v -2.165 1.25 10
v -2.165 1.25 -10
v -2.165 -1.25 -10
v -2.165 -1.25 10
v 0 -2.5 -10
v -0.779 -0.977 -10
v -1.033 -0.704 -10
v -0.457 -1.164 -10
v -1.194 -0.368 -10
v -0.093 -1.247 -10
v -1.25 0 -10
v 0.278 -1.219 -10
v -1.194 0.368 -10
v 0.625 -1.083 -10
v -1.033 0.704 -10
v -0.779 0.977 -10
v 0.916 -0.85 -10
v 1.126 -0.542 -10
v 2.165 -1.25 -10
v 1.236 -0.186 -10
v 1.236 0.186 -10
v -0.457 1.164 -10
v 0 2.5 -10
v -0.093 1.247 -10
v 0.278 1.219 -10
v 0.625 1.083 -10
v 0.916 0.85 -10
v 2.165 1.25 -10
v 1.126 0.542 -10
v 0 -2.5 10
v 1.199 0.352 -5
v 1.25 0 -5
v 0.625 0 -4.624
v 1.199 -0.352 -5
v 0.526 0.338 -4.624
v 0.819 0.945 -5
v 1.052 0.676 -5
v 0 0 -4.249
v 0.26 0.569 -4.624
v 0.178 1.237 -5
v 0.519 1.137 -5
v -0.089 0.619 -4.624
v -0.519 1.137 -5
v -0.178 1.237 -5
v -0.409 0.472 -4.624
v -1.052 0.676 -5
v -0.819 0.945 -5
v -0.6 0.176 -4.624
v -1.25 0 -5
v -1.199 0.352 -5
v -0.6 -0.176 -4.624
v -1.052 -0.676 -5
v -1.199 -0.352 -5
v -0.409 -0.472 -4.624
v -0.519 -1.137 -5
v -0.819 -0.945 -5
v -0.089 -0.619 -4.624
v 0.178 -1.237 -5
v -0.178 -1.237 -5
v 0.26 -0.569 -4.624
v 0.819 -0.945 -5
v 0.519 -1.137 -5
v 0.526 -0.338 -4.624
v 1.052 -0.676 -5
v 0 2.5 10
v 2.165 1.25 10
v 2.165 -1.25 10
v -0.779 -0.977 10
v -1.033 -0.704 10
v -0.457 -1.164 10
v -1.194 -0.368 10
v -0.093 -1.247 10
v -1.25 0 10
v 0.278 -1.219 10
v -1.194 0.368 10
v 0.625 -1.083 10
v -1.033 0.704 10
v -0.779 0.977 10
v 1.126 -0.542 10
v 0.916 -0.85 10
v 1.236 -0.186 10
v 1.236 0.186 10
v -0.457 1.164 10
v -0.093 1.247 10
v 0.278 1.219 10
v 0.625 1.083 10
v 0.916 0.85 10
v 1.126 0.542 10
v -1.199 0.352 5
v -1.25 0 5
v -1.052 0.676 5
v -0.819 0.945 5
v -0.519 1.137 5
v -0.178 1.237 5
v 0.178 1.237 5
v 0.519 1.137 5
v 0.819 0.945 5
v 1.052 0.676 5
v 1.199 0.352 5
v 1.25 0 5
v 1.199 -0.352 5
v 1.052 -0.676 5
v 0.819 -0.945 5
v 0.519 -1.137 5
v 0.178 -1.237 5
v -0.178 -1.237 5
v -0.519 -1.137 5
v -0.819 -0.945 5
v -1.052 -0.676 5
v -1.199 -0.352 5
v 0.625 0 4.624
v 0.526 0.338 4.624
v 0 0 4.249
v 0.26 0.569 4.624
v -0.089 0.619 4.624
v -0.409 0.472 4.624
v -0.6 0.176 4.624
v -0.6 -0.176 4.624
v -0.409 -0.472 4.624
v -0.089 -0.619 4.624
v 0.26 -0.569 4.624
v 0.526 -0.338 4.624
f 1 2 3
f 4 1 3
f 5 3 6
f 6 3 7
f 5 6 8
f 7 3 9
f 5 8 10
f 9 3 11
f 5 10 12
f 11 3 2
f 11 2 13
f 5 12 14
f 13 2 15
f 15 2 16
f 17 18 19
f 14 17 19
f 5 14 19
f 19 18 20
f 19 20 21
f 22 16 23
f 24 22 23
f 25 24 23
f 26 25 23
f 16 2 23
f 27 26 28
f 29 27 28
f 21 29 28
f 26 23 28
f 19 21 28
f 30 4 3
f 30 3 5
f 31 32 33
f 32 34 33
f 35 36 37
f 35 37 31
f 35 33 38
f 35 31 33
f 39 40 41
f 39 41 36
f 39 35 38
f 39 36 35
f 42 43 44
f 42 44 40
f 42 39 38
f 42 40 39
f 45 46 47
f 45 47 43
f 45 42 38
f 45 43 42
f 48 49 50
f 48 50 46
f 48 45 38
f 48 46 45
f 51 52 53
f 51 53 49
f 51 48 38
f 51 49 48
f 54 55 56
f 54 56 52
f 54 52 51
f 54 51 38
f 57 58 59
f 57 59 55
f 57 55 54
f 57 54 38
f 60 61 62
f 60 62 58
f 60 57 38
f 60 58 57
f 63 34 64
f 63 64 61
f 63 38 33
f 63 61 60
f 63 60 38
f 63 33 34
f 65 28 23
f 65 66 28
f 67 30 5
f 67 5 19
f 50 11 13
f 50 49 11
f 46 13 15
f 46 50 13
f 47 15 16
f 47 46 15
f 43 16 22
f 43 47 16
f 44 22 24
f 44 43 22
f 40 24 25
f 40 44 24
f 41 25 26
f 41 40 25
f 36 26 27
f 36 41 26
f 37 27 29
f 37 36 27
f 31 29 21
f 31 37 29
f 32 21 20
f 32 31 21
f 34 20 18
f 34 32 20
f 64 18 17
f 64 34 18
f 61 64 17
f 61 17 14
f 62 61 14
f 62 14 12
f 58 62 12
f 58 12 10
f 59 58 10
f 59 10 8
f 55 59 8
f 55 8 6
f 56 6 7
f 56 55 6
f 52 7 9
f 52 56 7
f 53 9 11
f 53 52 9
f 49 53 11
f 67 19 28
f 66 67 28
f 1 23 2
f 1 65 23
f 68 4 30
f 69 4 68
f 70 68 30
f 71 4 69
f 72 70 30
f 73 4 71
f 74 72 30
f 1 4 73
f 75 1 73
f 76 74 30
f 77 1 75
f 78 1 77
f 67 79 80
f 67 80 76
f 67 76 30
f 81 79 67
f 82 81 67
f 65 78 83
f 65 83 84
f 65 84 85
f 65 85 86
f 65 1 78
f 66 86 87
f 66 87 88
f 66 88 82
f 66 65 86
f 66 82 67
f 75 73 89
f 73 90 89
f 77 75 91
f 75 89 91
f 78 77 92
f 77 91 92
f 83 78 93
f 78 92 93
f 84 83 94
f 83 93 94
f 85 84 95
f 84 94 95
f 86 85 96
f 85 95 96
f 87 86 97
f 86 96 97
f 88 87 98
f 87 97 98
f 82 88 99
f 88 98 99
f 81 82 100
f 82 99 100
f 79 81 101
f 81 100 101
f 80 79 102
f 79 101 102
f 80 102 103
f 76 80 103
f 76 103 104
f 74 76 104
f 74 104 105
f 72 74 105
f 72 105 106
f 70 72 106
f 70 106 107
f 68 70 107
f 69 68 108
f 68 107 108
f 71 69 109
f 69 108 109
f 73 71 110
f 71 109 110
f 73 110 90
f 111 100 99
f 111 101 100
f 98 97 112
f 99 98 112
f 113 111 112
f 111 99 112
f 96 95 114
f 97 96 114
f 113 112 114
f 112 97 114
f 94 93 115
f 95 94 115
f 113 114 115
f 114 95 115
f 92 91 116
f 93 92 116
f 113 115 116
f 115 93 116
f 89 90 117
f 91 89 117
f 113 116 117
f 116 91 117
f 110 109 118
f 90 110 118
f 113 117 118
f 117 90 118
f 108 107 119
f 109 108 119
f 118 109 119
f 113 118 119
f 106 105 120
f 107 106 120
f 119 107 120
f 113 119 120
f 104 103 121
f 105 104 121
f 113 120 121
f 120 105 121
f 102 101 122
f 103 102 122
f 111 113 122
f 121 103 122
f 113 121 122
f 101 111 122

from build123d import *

# Parameters (mm, degrees)
F1_DEPTH = 10
F3_D     = 2.5
F3_DEPTH = 5
F3_TIP   = 0.7510757738


with BuildPart() as f1:
    # F0 (on Top) → F1 (new body)
    with BuildSketch(Plane.XY):
        Polygon((0, -2.5), (0, 0), (0, 2.5), (-2.1650635095, 1.25), (-2.1650635095, -1.25), align=None)
        Polygon((0, 2.5), (0, 0), (0, -2.5), (2.1650635095, -1.25), (2.1650635095, 1.25), align=None)
    extrude(amount=F1_DEPTH)

    # F3
    with Locations(Plane.XY.offset(10)):
        with Locations((0, 0)):
            Hole(F3_D / 2, depth=F3_DEPTH)
            with Locations((0, 0, -(F3_DEPTH + F3_TIP / 2))):  # 118° drill point
                Cone(0, F3_D / 2, F3_TIP, mode=Mode.SUBTRACT)

    # F4: F1 across plane


with BuildPart() as f1_1:
    add(f1.part)
    add(f1.part.mirror(Plane.XY))


solid = f1_1.part
